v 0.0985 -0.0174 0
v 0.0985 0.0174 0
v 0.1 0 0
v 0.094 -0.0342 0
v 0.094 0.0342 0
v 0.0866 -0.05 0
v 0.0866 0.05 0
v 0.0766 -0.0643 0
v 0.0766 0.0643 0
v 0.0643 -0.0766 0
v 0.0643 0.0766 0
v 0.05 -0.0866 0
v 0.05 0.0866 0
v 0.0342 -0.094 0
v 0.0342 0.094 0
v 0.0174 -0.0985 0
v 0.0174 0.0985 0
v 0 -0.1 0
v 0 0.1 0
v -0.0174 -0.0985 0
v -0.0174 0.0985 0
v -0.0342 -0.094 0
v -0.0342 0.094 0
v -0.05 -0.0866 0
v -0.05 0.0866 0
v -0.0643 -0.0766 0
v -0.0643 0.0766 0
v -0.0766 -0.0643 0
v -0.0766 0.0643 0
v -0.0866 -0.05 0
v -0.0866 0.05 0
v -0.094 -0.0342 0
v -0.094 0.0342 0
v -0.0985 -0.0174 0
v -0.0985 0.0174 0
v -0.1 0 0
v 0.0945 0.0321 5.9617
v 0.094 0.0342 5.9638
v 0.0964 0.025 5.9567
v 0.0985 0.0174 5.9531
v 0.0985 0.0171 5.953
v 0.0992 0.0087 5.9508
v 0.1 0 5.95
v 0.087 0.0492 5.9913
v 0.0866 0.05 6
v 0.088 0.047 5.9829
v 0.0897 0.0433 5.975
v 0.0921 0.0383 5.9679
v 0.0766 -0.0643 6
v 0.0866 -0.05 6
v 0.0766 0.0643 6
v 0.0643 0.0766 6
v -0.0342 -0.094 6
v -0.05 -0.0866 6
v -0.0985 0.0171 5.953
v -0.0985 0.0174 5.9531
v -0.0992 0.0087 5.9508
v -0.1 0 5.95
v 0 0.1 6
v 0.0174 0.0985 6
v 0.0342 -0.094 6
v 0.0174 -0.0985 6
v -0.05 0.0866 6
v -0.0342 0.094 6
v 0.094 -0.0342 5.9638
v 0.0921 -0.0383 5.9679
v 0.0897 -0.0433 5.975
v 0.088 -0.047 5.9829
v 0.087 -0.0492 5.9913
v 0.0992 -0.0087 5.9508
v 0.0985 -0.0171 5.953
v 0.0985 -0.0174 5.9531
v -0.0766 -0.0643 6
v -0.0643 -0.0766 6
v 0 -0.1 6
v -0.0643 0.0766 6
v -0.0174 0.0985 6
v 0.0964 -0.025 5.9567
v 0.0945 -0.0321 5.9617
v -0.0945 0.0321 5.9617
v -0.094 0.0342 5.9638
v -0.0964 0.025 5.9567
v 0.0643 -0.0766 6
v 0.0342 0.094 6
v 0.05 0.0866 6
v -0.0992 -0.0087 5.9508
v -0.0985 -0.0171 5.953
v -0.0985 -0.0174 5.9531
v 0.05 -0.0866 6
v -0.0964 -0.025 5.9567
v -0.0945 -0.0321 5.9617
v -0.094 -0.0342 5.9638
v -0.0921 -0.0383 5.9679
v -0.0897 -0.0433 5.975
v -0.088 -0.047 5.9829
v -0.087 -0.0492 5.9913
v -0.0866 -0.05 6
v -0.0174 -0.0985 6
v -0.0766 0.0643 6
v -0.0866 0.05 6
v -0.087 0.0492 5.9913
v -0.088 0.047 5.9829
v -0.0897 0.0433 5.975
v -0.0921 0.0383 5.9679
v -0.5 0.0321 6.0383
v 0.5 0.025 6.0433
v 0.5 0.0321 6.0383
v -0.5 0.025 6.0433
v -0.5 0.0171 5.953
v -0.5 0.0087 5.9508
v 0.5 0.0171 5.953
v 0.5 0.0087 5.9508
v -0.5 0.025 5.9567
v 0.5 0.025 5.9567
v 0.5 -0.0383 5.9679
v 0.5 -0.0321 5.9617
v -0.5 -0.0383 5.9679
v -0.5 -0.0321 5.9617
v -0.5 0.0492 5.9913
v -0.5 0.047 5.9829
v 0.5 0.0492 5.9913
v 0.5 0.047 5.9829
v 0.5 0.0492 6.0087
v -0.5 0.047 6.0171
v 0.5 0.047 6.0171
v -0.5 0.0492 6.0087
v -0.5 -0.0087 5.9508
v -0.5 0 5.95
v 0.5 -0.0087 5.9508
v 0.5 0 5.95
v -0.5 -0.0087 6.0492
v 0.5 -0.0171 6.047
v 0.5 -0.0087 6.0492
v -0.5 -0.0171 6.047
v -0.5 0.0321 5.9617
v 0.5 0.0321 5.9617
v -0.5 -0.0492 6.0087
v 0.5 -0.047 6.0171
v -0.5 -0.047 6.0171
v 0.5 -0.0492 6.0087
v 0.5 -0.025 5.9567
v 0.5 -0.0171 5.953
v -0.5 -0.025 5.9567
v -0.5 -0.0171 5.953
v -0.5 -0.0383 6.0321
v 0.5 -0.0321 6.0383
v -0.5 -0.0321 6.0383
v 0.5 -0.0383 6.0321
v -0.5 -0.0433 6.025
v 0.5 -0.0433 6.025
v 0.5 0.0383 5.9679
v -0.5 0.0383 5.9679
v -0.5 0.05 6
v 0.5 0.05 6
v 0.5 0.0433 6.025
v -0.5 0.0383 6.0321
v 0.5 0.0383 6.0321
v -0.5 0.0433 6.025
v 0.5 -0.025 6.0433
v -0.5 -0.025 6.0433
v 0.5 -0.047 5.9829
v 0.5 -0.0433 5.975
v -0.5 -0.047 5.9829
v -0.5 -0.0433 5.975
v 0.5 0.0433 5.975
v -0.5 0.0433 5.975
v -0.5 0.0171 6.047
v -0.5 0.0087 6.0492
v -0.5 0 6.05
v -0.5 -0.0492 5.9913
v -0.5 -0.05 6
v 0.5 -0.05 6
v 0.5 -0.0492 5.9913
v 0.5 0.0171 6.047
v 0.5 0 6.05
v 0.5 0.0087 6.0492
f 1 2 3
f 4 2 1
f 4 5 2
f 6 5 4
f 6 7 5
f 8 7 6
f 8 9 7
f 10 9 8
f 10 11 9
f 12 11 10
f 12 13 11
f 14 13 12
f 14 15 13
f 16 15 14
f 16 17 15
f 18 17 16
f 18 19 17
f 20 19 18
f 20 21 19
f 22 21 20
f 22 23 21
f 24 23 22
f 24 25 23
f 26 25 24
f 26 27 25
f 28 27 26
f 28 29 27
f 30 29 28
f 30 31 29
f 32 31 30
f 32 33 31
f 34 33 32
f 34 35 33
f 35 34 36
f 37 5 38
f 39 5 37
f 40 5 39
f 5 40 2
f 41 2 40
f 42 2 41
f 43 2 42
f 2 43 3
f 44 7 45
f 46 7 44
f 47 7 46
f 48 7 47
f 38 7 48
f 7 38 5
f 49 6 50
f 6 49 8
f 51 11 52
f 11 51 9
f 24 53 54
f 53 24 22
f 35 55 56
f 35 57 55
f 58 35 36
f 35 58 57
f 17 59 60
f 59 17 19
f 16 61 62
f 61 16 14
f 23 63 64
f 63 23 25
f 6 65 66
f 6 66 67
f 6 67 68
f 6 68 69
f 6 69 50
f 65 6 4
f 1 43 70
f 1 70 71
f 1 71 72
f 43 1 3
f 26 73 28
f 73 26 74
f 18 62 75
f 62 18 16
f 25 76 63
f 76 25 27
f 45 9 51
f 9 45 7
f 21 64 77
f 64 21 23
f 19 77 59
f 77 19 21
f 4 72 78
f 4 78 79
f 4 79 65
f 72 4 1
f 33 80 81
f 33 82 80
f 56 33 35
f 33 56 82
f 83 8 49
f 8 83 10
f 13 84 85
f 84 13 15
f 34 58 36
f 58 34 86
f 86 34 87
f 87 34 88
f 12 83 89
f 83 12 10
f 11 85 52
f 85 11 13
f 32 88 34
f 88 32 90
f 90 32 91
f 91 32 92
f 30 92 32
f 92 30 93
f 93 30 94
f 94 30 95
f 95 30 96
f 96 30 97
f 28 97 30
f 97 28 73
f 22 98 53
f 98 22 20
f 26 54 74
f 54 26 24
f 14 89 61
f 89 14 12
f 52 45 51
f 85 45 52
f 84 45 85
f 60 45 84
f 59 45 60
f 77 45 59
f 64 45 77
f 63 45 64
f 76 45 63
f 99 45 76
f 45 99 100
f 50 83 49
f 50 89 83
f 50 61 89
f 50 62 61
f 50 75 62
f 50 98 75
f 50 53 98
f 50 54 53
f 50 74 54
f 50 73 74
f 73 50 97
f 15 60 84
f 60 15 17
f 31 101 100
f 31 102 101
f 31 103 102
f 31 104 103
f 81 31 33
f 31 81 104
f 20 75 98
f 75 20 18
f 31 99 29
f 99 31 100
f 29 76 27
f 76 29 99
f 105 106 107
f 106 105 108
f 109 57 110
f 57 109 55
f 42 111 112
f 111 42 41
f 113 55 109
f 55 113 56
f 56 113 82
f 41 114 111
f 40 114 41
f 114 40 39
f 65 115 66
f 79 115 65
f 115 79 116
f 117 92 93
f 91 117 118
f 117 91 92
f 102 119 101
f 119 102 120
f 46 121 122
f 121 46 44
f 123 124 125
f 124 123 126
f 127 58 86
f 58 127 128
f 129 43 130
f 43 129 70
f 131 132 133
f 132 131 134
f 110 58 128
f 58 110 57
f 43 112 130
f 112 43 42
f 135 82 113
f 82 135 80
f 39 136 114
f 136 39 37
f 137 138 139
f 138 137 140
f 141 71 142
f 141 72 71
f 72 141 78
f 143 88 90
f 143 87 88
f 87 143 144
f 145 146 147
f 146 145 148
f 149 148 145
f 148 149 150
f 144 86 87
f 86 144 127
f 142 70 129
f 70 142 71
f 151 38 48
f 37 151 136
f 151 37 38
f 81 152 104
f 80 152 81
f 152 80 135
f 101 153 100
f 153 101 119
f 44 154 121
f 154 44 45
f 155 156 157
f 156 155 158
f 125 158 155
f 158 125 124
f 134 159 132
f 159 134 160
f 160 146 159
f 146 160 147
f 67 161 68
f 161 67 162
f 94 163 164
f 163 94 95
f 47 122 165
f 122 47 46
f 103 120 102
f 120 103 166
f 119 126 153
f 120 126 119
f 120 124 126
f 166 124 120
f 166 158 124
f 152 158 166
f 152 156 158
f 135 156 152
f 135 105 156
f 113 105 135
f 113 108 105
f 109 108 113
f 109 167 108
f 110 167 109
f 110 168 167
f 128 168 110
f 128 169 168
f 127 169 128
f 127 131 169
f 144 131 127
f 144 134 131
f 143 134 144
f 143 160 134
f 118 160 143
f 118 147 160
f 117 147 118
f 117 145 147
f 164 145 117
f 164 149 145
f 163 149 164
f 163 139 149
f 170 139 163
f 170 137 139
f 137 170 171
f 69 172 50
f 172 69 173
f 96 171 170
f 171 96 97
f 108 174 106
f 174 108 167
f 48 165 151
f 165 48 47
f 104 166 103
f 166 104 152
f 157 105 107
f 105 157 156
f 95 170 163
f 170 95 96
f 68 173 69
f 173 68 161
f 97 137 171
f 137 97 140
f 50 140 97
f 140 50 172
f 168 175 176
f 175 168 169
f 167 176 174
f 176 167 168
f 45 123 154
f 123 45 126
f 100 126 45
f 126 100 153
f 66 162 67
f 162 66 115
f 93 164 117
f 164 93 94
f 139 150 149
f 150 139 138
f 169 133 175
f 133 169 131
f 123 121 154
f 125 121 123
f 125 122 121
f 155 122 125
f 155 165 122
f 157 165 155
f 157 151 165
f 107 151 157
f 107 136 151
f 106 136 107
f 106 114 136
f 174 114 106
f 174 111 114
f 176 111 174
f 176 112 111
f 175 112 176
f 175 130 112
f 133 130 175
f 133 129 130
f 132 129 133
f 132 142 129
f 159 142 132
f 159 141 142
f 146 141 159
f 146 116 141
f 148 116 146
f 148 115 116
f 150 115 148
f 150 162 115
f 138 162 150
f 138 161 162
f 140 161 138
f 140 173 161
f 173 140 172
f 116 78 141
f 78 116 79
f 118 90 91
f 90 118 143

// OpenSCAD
// file: lib.scad
function x(v) = v[0];
function y(v) = v[1];
function z(v) = v[2];
function add(v1,v2) = [ for (i = [ 0 : len(v1)-1 ]) v1[i] + v2[i] ];
function xv(d) = [d,0,0];
function yv(d) = [0,d,0];
function zv(d) = [0,0,d];

module box(v) { cube(size=v, center=true); }
module cyl(r1,r2,h) { cylinder(r1=r1, r2=r2, h=h, center=true); }

function grow(n,v) = [x(v)+n*2, y(v)+n*2, z(v)+n*2];

module rbox(v, radius=1) {
	cx = x(v)/2-radius;
	cy = y(v)/2-radius;
	cz = z(v)/2-radius;

	hull() {
		translate([cx,cy,cz]) sphere(r=radius);
		translate([cx,cy,-cz]) sphere(r=radius);
		translate([cx,-cy,cz]) sphere(r=radius);
		translate([cx,-cy,-cz]) sphere(r=radius);
		translate([-cx,cy,cz]) sphere(r=radius);
		translate([-cx,cy,-cz]) sphere(r=radius);
		translate([-cx,-cy,cz]) sphere(r=radius);
		translate([-cx,-cy,-cz]) sphere(r=radius);
	}
}

module fillet(r=1) {
  minkowski() {
    difference() {
      children();
      minkowski() {
        difference() {
          minkowski() {
            children();
            sphere(r=r);
          }
          children();
        }
        sphere(r=r);
      }
    }
    sphere(r=r);
  }
}
// main file
use <lib.scad>

module small() {
	union() {
		translate([0,0,3.0]) cyl(0.1, 0.1, 6.0);
		translate([0,0,6.0]) rotate([0,90,0]) cyl(0.05, 0.05, 1.0);
	}
}

small($fn=36);
